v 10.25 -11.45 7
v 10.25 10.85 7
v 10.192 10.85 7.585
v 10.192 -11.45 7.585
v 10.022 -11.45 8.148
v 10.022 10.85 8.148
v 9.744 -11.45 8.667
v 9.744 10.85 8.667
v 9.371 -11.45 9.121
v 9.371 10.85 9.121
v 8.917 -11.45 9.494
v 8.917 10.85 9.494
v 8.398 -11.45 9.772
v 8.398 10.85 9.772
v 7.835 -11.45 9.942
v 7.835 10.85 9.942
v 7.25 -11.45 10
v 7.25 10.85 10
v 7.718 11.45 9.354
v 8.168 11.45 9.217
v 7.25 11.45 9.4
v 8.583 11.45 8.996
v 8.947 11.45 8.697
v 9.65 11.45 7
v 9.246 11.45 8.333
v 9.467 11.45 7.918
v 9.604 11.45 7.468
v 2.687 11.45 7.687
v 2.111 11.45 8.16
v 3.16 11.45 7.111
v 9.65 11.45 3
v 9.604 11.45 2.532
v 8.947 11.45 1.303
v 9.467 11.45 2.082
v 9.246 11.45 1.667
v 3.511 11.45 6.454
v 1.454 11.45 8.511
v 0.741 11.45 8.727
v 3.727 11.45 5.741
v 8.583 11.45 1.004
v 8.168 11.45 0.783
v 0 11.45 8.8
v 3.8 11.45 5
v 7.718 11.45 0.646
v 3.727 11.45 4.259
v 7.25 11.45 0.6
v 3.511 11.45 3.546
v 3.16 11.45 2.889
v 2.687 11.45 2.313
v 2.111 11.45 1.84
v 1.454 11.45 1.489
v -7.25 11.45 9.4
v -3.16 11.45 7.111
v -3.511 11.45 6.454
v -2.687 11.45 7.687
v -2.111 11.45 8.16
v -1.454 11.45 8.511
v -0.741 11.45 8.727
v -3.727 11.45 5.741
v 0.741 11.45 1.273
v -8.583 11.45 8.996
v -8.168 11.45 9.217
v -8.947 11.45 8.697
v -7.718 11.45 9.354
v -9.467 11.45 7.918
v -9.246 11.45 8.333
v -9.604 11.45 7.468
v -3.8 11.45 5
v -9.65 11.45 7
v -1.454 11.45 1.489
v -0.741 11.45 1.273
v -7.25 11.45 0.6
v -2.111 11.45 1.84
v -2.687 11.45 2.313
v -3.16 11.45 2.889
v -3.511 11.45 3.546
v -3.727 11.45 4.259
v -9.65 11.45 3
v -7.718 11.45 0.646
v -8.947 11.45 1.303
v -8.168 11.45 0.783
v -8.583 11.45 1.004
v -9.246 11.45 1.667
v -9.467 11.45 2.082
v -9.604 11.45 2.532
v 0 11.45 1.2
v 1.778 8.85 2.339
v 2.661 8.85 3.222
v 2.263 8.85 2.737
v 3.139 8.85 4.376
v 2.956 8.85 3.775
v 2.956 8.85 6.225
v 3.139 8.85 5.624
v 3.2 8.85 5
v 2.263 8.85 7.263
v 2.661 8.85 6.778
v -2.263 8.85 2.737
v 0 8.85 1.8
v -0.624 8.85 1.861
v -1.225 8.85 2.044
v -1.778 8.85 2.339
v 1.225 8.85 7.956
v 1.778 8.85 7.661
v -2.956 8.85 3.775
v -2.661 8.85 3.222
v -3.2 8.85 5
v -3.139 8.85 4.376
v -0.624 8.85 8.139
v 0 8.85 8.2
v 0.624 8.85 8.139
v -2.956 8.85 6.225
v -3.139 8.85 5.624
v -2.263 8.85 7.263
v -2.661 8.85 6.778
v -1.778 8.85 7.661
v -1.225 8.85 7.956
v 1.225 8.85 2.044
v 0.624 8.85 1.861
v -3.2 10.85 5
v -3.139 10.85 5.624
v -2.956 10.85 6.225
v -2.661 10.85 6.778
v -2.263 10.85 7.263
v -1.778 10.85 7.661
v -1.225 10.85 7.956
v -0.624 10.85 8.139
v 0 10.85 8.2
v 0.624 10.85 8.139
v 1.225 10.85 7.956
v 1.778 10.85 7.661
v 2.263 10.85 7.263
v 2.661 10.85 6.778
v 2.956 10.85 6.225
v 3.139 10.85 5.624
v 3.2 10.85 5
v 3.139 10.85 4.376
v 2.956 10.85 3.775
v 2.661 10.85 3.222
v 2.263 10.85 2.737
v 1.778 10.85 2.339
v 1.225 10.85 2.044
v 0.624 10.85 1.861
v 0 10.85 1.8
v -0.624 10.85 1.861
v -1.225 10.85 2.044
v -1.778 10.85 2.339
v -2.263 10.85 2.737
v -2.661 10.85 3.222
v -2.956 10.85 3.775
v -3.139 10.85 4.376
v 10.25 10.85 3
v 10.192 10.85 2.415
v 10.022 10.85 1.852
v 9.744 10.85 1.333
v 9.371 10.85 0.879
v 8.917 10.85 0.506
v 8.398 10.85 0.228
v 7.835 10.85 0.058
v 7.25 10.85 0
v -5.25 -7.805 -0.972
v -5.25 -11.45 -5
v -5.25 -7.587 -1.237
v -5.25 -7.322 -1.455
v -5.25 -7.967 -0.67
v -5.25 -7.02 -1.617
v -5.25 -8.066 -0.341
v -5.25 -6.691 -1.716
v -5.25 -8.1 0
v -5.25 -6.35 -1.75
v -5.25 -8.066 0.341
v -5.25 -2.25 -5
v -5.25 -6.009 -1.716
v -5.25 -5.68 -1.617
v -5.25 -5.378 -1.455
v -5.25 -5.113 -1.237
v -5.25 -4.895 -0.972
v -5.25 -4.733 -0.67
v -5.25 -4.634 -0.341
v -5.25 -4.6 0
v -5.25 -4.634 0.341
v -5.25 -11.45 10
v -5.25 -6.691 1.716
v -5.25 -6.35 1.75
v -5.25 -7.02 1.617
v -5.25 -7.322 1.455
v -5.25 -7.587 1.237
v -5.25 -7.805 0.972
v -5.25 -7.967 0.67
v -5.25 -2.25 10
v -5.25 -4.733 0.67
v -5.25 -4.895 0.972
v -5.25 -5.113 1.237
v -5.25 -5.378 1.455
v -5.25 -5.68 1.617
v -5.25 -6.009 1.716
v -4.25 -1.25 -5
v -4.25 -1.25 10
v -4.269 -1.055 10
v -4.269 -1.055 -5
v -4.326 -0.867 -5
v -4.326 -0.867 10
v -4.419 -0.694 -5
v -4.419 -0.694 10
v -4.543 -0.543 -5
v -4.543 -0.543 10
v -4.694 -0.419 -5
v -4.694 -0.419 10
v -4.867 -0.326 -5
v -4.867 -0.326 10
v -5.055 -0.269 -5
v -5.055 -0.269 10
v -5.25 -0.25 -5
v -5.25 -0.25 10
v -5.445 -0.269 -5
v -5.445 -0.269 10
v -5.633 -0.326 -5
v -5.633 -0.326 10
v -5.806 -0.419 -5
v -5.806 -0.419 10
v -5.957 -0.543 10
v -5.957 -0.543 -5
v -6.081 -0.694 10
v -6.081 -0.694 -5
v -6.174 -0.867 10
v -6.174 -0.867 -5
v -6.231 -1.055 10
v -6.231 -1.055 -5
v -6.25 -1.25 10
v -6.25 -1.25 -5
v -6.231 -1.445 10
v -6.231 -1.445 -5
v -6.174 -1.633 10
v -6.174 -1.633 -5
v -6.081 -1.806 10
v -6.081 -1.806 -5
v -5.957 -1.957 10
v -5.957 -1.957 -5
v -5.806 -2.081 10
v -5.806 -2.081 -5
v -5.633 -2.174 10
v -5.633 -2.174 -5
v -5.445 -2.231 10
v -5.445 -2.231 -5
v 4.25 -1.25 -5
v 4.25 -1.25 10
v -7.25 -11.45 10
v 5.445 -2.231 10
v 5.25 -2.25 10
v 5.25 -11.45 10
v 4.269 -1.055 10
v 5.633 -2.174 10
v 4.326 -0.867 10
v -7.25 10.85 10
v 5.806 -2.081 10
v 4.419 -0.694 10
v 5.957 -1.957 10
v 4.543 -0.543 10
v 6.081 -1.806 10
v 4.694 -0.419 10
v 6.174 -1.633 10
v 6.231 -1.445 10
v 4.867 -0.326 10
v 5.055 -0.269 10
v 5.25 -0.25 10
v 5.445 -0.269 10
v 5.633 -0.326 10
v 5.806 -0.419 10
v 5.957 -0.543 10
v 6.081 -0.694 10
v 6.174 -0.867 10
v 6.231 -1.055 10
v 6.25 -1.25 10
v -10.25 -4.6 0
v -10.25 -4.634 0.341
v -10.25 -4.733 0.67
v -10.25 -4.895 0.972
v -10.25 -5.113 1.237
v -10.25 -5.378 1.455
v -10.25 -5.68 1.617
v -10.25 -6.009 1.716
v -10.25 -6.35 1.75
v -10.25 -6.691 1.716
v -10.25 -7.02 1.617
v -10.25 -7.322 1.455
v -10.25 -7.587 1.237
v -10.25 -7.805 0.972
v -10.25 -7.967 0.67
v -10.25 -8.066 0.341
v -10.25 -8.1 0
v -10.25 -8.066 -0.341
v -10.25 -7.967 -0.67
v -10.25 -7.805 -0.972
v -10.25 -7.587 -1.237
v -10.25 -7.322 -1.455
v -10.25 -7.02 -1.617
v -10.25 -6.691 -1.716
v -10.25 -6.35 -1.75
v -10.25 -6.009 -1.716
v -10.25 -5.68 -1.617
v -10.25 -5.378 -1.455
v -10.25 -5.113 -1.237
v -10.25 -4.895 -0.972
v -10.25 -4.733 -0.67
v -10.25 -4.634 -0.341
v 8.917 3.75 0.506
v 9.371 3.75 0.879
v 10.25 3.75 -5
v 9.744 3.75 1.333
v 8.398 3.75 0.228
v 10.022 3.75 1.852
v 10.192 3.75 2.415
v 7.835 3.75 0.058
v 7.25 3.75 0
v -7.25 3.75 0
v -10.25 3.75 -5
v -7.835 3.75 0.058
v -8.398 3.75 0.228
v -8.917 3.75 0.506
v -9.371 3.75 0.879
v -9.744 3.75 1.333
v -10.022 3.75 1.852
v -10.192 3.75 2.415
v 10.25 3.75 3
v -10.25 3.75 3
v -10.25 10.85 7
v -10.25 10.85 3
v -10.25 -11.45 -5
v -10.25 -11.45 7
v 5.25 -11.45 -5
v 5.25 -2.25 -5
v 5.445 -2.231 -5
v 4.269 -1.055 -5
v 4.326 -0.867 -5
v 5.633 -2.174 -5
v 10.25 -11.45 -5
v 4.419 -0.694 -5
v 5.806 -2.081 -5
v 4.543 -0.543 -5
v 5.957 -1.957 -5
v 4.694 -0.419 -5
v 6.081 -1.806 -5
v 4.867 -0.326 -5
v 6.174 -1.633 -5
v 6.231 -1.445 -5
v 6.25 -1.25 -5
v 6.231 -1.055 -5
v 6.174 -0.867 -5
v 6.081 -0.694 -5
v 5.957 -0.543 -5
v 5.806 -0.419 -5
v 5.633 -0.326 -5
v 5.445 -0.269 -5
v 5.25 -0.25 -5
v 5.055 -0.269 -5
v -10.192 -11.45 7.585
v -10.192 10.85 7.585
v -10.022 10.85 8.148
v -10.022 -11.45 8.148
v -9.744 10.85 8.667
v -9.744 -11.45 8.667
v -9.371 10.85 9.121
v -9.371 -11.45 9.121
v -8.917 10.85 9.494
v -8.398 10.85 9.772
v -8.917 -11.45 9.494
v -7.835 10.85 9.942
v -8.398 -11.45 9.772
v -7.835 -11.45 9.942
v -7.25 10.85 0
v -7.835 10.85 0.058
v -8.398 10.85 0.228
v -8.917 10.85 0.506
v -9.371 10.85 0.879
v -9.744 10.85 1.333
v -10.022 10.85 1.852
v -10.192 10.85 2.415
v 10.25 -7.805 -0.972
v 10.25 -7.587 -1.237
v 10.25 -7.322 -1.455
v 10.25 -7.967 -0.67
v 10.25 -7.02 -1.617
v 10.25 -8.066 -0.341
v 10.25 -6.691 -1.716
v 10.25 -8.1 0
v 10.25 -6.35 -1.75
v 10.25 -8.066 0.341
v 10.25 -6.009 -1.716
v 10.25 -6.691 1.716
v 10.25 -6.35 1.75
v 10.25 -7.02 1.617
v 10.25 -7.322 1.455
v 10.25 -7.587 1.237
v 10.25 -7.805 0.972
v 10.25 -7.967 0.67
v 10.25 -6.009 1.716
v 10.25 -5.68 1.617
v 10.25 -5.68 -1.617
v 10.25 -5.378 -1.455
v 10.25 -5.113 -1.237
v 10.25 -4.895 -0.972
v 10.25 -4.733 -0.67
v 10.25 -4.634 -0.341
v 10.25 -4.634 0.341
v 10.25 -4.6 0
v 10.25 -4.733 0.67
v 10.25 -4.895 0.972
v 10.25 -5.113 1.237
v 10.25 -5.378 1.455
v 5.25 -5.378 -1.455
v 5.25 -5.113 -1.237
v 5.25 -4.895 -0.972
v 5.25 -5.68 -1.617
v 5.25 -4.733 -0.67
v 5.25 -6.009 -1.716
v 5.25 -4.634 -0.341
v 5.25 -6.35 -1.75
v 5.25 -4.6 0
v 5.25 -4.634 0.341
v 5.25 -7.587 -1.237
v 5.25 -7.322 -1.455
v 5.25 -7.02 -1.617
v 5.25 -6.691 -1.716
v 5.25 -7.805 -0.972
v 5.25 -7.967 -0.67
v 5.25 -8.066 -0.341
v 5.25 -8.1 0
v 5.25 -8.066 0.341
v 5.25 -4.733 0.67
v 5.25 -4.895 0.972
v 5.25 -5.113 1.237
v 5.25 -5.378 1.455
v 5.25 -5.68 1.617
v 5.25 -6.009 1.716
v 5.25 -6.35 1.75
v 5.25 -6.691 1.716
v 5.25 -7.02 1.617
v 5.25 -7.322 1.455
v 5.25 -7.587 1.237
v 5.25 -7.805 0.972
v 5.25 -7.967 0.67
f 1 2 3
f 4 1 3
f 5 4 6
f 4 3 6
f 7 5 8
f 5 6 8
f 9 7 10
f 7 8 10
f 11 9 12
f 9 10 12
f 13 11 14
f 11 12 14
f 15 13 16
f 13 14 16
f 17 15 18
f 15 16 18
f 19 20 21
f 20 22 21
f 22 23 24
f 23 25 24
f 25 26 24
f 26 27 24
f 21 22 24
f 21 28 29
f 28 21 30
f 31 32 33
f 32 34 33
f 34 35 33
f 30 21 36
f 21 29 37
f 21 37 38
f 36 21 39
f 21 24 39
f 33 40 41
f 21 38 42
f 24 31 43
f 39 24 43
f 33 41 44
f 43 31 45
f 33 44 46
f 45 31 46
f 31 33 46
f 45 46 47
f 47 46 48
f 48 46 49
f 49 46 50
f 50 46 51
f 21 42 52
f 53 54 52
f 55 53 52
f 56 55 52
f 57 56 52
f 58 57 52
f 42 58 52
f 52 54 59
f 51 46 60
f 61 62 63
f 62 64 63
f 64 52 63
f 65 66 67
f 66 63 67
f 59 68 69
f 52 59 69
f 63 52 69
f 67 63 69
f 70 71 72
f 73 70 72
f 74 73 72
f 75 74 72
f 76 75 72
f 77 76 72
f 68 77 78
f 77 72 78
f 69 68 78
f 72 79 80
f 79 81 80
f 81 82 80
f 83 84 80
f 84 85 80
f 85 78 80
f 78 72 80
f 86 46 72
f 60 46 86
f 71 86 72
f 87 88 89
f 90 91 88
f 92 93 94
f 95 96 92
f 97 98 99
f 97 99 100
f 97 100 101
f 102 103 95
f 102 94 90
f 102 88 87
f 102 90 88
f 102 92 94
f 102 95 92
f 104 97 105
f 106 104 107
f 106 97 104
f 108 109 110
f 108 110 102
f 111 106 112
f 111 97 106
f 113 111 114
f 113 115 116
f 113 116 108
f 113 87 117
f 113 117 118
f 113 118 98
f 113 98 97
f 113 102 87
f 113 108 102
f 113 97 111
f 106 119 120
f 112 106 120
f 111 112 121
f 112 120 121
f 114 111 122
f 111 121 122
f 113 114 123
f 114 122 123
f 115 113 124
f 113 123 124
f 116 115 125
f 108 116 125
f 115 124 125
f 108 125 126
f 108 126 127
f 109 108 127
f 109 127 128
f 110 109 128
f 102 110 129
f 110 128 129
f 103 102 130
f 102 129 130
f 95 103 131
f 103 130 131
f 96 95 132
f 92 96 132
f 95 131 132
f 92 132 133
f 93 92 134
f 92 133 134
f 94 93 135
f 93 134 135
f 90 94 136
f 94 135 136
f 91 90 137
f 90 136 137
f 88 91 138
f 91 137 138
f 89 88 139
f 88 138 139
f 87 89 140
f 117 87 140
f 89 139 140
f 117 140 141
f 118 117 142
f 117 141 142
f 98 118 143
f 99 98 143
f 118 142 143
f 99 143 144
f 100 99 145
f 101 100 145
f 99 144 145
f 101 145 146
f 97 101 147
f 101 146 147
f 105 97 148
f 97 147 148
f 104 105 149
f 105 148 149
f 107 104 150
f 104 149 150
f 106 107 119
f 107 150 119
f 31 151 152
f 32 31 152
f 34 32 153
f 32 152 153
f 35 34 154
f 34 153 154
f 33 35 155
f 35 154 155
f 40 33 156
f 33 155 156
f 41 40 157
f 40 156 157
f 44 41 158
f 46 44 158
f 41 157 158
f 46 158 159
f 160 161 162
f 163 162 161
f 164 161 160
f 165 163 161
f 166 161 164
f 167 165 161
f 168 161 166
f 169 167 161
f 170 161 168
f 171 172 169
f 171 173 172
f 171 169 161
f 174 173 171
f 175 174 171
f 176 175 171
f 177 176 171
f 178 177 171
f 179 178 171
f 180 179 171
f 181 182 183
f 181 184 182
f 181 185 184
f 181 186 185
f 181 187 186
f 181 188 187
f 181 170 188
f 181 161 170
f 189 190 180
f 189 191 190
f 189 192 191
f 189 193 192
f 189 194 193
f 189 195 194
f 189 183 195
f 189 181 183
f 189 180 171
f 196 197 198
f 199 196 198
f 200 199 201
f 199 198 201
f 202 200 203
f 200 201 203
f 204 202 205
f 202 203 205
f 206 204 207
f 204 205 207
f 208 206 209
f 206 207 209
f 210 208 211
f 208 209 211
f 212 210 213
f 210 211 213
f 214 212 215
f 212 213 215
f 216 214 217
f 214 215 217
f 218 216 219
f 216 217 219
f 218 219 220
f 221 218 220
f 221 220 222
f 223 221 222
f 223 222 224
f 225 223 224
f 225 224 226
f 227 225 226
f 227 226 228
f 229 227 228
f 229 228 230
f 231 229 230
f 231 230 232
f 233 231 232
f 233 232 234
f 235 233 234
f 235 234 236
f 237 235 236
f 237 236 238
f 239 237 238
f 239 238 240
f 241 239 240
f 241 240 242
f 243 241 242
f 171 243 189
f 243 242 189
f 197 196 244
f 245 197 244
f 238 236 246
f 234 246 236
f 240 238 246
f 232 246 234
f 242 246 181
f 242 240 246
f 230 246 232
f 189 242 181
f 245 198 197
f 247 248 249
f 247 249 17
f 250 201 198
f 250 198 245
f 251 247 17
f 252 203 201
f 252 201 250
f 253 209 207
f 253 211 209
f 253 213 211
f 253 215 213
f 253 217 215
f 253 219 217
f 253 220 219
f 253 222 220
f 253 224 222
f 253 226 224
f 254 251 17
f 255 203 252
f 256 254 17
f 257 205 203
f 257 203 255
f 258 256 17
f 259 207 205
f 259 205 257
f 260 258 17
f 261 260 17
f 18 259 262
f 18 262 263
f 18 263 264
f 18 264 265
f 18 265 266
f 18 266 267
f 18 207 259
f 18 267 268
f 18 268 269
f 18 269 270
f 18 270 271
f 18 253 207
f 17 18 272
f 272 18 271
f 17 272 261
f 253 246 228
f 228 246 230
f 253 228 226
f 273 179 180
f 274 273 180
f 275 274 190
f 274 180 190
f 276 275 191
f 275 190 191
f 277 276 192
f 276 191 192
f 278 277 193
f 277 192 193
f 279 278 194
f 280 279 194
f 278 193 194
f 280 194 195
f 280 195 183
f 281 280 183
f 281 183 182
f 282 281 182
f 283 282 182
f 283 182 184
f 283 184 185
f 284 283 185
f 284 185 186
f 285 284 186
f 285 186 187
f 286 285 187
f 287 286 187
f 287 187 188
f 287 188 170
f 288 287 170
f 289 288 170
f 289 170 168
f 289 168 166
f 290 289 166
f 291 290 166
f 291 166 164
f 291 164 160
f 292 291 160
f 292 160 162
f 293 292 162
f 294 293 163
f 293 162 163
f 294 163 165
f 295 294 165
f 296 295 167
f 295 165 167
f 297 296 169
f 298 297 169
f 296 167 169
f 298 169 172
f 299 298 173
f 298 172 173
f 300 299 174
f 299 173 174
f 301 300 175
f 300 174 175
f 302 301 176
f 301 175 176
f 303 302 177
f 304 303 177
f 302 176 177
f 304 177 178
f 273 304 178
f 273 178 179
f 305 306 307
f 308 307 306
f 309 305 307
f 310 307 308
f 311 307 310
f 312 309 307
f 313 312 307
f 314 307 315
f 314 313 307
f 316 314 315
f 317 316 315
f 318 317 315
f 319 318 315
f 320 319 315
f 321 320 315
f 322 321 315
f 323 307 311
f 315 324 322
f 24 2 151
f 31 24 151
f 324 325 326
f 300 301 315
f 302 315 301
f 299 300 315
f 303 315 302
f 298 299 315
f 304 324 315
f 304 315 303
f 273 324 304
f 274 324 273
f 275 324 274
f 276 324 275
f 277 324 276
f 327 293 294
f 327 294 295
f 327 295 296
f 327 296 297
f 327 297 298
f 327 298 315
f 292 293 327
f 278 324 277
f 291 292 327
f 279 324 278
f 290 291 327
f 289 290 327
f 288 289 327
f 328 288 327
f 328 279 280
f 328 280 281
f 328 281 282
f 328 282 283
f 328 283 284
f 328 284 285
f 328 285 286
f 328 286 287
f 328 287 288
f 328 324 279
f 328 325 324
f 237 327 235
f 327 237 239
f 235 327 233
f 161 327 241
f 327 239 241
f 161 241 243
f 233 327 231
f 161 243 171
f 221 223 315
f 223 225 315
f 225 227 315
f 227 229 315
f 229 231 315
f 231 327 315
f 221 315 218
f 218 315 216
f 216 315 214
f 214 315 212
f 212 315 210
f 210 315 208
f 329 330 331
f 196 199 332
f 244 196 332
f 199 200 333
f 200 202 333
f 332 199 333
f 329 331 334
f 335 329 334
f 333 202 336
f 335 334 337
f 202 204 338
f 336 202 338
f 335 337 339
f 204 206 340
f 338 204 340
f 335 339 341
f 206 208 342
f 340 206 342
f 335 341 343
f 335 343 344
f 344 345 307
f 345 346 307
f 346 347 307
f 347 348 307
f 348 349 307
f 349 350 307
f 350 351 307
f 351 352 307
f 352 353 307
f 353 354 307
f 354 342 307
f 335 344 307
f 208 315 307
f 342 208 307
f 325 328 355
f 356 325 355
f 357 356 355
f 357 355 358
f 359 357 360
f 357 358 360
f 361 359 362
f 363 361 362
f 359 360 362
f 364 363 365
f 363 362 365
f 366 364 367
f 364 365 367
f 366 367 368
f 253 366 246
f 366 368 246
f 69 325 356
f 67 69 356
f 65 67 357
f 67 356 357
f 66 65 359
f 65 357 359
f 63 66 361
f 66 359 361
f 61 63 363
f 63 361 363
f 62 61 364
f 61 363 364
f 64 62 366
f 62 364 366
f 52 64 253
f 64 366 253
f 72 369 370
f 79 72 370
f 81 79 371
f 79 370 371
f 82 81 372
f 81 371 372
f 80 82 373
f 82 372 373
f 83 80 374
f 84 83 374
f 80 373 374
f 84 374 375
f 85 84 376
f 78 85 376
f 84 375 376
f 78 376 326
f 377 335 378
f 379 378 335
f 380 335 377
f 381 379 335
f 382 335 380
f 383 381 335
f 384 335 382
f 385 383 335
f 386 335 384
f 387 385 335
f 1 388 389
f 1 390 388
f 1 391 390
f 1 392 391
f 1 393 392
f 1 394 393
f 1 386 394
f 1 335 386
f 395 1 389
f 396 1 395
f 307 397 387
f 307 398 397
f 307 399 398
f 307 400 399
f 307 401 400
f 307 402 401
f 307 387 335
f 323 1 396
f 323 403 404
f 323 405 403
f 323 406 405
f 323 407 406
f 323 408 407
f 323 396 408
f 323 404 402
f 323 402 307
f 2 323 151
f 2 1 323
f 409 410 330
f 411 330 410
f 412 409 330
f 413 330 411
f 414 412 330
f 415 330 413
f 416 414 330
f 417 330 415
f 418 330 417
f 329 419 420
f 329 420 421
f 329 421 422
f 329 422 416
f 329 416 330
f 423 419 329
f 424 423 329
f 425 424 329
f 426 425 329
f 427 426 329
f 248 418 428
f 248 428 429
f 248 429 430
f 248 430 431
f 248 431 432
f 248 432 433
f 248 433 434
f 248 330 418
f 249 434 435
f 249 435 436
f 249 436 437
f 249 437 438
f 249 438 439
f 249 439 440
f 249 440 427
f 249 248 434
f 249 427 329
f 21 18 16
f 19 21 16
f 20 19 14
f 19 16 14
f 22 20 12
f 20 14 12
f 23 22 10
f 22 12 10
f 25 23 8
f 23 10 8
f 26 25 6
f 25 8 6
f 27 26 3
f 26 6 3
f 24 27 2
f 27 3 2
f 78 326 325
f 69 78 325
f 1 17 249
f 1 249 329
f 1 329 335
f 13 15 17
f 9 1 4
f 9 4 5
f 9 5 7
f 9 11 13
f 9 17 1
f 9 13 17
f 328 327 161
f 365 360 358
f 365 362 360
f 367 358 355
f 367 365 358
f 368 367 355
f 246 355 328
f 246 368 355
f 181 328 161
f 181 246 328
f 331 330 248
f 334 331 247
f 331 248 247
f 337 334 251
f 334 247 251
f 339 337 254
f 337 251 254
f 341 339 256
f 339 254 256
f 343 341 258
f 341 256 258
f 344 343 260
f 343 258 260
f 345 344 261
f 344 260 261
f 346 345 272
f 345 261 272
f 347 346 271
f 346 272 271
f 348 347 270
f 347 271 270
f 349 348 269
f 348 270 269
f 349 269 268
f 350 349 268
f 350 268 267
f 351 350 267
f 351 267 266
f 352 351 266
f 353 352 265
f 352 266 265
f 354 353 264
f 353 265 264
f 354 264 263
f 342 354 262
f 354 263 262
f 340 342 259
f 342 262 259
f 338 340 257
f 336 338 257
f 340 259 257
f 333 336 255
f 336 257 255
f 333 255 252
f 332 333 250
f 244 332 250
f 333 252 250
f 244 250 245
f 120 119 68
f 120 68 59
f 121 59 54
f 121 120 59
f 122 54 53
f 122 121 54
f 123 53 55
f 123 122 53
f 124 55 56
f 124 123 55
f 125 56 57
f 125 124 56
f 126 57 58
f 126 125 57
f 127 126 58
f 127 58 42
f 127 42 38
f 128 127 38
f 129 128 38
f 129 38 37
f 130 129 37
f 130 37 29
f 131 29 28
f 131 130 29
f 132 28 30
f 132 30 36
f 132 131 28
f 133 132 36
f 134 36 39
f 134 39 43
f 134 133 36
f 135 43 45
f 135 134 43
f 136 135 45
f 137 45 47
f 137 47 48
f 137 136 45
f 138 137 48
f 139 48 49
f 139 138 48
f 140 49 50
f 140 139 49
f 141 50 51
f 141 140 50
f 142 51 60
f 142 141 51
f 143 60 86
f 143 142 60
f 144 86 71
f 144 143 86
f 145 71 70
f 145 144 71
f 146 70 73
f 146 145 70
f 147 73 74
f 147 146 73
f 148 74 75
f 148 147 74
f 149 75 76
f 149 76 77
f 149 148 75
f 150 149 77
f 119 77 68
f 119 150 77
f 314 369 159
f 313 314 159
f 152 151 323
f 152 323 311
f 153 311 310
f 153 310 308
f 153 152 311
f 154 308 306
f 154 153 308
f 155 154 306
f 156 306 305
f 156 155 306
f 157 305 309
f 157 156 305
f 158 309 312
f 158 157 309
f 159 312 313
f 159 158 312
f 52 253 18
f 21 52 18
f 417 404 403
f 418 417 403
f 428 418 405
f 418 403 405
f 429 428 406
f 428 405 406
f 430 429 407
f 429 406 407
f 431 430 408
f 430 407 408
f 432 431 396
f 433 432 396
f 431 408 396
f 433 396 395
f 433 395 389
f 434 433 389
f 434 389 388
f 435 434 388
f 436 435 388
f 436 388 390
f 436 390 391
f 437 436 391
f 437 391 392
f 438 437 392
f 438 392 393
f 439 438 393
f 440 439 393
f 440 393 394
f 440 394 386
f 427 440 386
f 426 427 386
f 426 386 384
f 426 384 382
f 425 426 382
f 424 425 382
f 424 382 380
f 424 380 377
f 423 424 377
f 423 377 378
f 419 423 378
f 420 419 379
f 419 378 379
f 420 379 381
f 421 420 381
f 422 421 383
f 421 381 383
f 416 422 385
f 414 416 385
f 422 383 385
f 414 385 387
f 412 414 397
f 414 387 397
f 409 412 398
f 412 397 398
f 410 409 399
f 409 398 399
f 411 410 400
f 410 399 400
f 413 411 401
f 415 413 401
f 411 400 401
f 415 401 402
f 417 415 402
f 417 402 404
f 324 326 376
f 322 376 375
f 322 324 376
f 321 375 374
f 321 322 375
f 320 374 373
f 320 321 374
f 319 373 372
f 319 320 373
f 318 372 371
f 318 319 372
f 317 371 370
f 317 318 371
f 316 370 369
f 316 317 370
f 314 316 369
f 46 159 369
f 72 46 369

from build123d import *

# Parameters (mm, degrees)
EXTRUDE_1_DEPTH     = 10
EXTRUDE_2_DEPTH     = 5
SKETCH_2_R          = 3.2
CUT_EXTRUDE_1_DEPTH = 2.6
SKETCH_4_R          = 1
CUT_EXTRUDE_3_DEPTH = 22.474752618
SKETCH_6_R          = 1.75
CUT_EXTRUDE_4_DEPTH = 26.521608492
FILLET_1_R          = 3
CHAMFER_1_SIZE      = 0.6


with BuildPart() as part:
    # ｽｹｯﾁ1 → ﾎﾞｽ - 押し出し1 (new body)
    with BuildSketch(Plane.XY):
        Polygon((-10.25, 11.45), (-10.25, -11.45), (-5.25, -11.45), (-5.25, -1.25), (5.25, -1.25), (5.25, -11.45), (10.25, -11.45), (10.25, 11.45), align=None)
    extrude(amount=EXTRUDE_1_DEPTH)

    # ｽｹｯﾁ5 → ﾎﾞｽ - 押し出し2 (add)
    with BuildSketch(Plane(origin=(0, 0, 0), x_dir=(-1, 0, 0), z_dir=(0, 0, -1))):
        Polygon((-10.25, 3.75), (10.25, 3.75), (10.25, -11.45), (5.25, -11.45), (5.25, -1.25), (-5.25, -1.25), (-5.25, -11.45), (-10.25, -11.45), align=None)
    extrude(amount=EXTRUDE_2_DEPTH)

    # ｽｹｯﾁ2 → ｶｯﾄ - 押し出し1 (cut)
    with BuildSketch(Plane(origin=(0, 11.45, 0), x_dir=(1, 0, 0), z_dir=(0, 1, 0))):
        with Locations(Location((0, -5, 0), (0, 0, 180))):
            Circle(SKETCH_2_R)
    extrude(amount=-CUT_EXTRUDE_1_DEPTH, mode=Mode.SUBTRACT)

    # ｽｹｯﾁ4 → ｶｯﾄ - 押し出し3 (cut, through all)
    with BuildSketch(Plane.XY.offset(10)):
        with Locations((5.25, -1.25)):
            Circle(SKETCH_4_R)
        with Locations((-5.25, -1.25)):
            Circle(SKETCH_4_R)
    extrude(amount=-CUT_EXTRUDE_3_DEPTH, mode=Mode.SUBTRACT)

    # ｽｹｯﾁ6 → ｶｯﾄ - 押し出し4 (cut, through all)
    with BuildSketch(Plane(origin=(10.25, 0, 0), x_dir=(0, 0, -1), z_dir=(1, 0, 0))):
        with Locations(Location((0, -6.35, 0), (0, 0, 90))):
            Circle(SKETCH_6_R)
    extrude(amount=-CUT_EXTRUDE_4_DEPTH, mode=Mode.SUBTRACT)

    # ﾌｨﾚｯﾄ1
    fillet_1_edges = [part.edges().sort_by_distance(p)[0] for p in [
        (10.25, 0, 10),
        (-10.25, 7.6, 0),
        (10.25, 7.6, 0),
        (-10.25, 0, 10),
    ]]
    fillet(fillet_1_edges, radius=FILLET_1_R)

    # 面取り1
    chamfer_1_edges = [part.edges().sort_by_distance(p)[0] for p in [
        (3.2, 11.45, 5),
        (0, 11.45, 0),
        (-10.25, 11.45, 5),
        (0, 11.45, 10),
        (10.25, 11.45, 5),
        (9.371320344, 11.45, 9.121320344),
        (9.371320344, 11.45, 0.878679656),
        (-9.371320344, 11.45, 9.121320344),
        (-9.371320344, 11.45, 0.878679656),
    ]]
    chamfer(chamfer_1_edges, length=CHAMFER_1_SIZE)


solid = part.part
